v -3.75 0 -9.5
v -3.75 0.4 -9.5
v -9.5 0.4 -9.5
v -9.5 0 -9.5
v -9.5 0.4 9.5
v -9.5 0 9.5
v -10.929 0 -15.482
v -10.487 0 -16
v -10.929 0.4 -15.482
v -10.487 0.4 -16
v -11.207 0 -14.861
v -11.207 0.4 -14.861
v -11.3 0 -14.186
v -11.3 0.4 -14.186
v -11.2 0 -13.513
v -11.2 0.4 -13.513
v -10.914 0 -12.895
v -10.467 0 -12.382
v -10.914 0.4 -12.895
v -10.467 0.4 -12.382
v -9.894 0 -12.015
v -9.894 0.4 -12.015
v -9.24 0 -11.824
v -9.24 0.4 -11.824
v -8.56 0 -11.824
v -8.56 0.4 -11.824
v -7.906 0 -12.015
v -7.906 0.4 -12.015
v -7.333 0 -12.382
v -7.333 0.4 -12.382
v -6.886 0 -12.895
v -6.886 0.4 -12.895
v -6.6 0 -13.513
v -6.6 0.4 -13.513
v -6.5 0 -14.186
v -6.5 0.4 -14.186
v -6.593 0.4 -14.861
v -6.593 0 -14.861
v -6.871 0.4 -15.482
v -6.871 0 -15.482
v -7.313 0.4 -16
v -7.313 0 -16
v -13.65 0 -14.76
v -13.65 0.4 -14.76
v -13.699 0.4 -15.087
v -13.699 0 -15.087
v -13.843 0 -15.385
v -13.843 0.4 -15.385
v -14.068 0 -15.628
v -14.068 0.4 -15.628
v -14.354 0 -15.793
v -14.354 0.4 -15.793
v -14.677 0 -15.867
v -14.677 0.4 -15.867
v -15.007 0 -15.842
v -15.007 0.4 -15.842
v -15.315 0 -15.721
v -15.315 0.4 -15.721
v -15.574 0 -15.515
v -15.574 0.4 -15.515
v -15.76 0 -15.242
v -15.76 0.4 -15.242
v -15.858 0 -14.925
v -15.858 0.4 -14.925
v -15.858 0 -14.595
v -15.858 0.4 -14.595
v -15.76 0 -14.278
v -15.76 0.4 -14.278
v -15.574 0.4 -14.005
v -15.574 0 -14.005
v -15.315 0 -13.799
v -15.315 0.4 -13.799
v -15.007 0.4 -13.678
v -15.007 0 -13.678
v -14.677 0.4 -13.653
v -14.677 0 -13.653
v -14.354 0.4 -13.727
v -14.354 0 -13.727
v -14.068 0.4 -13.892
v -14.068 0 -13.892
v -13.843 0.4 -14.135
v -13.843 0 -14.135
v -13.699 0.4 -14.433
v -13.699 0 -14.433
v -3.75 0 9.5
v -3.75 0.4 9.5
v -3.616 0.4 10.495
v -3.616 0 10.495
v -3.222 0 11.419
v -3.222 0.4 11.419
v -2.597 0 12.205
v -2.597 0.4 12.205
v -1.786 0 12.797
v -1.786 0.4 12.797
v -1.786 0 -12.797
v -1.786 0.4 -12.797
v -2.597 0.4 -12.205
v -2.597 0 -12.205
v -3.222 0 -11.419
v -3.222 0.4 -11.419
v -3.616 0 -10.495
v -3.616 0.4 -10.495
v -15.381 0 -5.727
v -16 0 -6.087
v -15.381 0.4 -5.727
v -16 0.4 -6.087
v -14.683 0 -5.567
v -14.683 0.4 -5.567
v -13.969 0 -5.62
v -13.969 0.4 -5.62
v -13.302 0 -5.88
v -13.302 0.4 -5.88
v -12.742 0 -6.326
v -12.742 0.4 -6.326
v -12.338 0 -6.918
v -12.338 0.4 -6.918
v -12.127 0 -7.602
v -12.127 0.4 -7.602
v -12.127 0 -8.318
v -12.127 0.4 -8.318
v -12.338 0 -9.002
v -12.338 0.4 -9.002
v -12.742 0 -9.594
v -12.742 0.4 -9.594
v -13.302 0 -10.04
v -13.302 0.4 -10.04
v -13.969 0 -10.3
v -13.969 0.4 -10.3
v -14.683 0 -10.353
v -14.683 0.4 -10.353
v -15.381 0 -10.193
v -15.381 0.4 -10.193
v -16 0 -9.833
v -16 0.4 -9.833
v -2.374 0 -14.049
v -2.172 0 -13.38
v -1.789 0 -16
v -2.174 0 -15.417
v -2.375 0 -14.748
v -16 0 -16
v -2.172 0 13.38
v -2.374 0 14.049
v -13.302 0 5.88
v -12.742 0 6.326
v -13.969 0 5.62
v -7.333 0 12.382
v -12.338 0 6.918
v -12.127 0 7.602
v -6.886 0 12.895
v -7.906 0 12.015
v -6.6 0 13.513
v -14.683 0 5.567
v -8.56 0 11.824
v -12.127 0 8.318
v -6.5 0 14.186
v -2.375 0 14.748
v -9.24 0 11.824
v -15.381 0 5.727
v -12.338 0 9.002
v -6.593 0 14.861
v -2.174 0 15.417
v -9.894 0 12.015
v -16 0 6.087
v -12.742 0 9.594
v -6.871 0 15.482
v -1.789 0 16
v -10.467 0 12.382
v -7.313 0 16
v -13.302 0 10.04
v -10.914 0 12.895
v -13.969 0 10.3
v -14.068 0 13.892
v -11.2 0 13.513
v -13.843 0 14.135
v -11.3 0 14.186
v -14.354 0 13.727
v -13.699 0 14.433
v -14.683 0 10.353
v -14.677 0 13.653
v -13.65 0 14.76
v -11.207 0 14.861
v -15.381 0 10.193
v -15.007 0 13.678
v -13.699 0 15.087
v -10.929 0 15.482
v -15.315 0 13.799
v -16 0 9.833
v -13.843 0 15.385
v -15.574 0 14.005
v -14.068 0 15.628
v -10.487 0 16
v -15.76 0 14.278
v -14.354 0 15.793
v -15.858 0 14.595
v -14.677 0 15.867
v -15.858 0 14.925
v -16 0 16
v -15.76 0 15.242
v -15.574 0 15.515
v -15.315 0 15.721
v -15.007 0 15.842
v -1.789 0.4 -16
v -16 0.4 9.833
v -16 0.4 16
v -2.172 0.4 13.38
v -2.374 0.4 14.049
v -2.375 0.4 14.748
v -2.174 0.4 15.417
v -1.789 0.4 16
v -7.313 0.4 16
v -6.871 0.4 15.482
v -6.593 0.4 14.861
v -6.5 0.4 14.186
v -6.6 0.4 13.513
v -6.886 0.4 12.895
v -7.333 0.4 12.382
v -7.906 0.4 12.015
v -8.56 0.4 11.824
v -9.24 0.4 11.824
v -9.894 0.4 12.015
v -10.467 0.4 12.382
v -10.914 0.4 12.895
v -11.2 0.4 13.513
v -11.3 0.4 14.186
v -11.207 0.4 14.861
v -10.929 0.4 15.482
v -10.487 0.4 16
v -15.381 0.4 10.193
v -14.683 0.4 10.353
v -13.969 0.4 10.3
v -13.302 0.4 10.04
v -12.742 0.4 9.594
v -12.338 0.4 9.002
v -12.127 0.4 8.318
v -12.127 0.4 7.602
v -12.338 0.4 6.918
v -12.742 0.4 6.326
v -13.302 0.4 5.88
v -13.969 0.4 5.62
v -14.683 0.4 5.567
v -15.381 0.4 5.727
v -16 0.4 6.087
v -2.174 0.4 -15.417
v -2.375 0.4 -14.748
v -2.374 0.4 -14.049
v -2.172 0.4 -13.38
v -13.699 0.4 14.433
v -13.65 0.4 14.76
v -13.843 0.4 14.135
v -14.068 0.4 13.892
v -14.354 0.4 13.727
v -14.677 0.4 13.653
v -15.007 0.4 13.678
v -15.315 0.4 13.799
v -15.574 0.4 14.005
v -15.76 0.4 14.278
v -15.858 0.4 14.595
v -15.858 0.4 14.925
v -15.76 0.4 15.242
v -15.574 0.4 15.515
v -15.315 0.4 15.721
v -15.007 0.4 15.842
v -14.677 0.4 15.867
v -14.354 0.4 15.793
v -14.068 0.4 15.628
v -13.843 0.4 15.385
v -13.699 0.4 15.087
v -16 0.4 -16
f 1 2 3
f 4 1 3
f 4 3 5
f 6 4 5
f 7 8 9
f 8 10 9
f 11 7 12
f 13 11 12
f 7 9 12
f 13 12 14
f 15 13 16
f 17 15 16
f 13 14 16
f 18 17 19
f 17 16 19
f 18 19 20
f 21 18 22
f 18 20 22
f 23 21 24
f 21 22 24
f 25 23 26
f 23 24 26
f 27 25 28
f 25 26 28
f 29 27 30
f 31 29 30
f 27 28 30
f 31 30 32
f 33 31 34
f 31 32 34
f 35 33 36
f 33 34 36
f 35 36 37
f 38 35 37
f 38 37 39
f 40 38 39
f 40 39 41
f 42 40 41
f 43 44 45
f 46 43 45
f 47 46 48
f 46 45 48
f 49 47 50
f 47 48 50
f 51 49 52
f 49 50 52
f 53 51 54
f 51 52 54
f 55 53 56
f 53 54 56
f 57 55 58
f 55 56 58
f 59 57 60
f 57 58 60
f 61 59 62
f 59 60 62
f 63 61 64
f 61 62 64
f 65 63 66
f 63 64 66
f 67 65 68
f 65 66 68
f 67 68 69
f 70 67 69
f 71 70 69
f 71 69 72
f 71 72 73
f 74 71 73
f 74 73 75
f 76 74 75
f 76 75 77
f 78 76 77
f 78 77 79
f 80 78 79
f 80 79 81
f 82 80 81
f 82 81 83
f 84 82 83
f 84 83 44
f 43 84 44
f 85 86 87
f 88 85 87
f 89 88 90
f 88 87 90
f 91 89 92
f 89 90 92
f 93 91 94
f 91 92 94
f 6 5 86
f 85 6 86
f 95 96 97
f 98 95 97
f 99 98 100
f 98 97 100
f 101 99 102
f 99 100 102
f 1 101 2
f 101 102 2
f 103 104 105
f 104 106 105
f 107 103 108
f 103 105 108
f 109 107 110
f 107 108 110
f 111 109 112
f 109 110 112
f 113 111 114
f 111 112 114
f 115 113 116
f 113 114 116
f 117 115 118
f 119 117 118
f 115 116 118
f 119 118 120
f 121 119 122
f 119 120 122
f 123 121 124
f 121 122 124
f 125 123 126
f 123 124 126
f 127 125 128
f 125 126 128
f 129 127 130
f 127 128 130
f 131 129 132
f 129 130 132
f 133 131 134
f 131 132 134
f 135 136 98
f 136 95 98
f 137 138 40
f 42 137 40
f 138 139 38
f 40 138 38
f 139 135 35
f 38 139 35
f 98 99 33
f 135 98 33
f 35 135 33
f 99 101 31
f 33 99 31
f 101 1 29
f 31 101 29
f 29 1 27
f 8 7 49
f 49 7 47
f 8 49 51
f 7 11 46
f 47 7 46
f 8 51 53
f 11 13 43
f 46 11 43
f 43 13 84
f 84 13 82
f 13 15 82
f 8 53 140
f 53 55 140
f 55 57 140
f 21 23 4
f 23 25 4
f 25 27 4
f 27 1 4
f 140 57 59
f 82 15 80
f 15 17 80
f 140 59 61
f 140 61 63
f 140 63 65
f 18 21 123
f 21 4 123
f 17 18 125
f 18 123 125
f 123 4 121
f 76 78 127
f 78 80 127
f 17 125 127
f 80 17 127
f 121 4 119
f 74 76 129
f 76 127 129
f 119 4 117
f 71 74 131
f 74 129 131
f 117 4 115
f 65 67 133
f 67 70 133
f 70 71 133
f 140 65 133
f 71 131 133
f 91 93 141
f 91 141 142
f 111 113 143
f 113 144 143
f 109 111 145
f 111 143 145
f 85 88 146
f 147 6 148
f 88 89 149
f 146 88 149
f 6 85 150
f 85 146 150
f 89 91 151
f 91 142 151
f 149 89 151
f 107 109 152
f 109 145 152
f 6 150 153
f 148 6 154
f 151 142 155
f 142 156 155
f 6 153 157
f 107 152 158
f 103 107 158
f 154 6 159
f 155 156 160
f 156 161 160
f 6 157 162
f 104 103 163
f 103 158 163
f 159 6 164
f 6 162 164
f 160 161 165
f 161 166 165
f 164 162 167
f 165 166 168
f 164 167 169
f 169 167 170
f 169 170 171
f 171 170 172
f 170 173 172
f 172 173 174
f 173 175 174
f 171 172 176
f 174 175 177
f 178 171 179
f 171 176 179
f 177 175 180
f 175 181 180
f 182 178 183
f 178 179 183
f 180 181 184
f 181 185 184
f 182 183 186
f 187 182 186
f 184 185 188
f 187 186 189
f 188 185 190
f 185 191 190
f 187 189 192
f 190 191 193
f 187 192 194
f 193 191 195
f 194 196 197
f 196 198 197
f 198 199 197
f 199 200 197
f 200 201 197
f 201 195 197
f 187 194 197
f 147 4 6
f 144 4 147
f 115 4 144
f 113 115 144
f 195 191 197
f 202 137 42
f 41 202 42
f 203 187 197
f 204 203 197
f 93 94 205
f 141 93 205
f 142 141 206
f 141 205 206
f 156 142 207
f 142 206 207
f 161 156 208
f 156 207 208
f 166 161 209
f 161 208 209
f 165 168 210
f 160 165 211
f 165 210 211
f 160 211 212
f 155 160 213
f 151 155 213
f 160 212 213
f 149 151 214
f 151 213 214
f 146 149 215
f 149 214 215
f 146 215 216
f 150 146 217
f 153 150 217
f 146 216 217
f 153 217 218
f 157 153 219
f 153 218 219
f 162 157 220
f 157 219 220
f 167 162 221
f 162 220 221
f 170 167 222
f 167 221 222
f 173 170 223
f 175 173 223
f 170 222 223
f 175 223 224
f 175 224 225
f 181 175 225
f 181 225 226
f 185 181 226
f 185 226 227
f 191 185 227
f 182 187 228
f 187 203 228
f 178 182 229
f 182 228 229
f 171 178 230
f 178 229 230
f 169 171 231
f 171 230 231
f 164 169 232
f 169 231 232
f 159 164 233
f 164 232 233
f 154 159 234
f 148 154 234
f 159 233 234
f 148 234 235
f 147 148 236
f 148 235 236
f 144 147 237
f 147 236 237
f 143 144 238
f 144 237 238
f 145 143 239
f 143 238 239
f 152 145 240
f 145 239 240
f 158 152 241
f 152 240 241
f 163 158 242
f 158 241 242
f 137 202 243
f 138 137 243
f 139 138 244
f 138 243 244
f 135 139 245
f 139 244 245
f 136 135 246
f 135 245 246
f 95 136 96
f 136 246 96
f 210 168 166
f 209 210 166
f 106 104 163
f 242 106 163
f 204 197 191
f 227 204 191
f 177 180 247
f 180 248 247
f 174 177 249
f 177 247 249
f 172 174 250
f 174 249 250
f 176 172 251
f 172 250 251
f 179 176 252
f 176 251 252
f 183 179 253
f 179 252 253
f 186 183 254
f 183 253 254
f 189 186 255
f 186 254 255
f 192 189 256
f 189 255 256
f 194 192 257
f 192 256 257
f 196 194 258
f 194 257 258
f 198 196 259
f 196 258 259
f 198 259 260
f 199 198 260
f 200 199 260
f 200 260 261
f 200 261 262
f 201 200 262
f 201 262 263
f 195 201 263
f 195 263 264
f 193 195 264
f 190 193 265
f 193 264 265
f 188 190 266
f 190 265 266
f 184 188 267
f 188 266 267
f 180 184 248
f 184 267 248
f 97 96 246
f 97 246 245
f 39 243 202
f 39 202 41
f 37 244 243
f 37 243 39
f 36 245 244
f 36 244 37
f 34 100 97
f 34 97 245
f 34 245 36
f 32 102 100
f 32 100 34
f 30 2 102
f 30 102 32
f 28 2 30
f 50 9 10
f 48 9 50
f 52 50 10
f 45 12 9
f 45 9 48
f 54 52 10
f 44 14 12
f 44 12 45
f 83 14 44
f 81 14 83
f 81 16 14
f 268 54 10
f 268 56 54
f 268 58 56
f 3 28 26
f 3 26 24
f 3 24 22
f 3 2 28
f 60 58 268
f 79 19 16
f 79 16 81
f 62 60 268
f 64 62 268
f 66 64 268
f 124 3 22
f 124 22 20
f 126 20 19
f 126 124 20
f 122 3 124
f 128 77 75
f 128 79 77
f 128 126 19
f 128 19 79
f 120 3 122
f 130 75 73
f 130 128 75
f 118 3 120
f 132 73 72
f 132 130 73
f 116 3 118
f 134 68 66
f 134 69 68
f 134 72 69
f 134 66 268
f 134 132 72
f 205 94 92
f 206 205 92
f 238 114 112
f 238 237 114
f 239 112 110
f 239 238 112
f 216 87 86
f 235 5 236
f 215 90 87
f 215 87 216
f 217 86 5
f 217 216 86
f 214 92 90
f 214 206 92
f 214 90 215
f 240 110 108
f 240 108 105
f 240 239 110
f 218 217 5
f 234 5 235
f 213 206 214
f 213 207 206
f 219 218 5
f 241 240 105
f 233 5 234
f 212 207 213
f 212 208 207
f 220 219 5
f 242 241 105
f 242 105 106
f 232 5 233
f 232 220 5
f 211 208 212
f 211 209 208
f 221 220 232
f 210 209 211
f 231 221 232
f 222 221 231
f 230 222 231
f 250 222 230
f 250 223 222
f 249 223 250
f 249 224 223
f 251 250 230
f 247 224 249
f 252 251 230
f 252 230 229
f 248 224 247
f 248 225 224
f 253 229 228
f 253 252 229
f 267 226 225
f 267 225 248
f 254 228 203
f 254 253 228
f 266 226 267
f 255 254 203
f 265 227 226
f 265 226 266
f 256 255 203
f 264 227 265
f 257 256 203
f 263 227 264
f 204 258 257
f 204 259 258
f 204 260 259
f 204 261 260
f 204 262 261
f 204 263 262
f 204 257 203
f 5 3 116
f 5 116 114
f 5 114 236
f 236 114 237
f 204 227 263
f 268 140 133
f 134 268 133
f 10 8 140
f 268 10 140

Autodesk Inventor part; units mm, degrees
ref_plane "YZ Plane" through (0, 0, 0) normal (1, 0, 0) x (0, 1, 0)
ref_plane "XZ Plane" through (0, 0, 0) normal (0, 1, 0) x (-1, 0, 0)
ref_plane "XY Plane" through (0, 0, 0) normal (0, 0, 1) x (1, 0, 0)
sketch "Sketch1" plane through (0, 0, 0) normal (0, 1, 0) x (-1, 0, 0)
  line L0 (16, 16) -> (-16, 16)
  line L1 (-16, 16) -> (-16, -16)
  line L2 (-16, -16) -> (16, -16)
  line L3 (16, -16) -> (16, 16)
  line L4 (16, 16) -> (-16, -16) construction
  line L5 (-16, 16) -> (16, -16) construction
  point P0 (0, 0)
  dimension "d0" = 32
  dimension "d1" = 32
extrude "Extrusion1" add sketch "Sketch1" along normal blind 0.4
sketch "Sketch2" plane through (0, 0.4, 0) normal (0, 1, 0) x (1, 0, 0)
  line L0 (-9.5, -9.5) -> (9.5, -9.5)
  line L1 (9.5, -9.5) -> (9.5, 9.5)
  line L2 (9.5, 9.5) -> (-9.5, 9.5)
  line L3 (-9.5, 9.5) -> (-9.5, -9.5)
  line L4 (-9.5, -9.5) -> (9.5, 9.5) construction
  line L5 (9.5, -9.5) -> (-9.5, 9.5) construction
  circle A0 centre (0, 9.5) radius 3.75
  circle A1 centre (0, -9.5) radius 3.75
  point P0 (0, 0)
  point P1 (-3.75, -9.5)
  point P2 (3.75, -9.5)
  point P3 (3.75, 9.5)
  point P4 (-3.75, 9.5)
  dimension "d4" = 19
  dimension "d5" = 19
  dimension "d6" = 7.5
  dimension "d7" = 7.5
extrude "Extrusion2" cut sketch "Sketch2" against normal blind 0.4
sketch "Sketch3" plane through (0, 0.4, 0) normal (0, 1, 0) x (1, 0, 0)
  line L0 (-16, -16) -> (16, -16) projected
  line L1 (16, 16) -> (-16, 16) projected
  line L2 (0, -16) -> (16, -16)
  line L3 (16, -16) -> (16, 16)
  line L4 (16, 16) -> (0, 16)
  line L5 (0, 16) -> (0, -16)
  point P0 (0, 0)
extrude "Extrusion3" cut sketch "Sketch3" against normal blind 0.4
sketch "Sketch4" plane through (0, 0.4, 0) normal (0, 1, 0) x (1, 0, 0)
  circle A0 centre (-14.76, -14.76) radius 1.11
  circle A1 centre (-14.76, 14.76) radius 1.11
  line L0 (-16, 16) -> (-16, -16) projected
  line L1 (-16, -16) -> (0, -16) projected
  line L2 (0, 16) -> (-16, 16) projected
  circle A2 centre (0, -14.4) radius 2.4
  circle A3 centre (-14.5, 7.96) radius 2.4
  circle A4 centre (-14.5, -7.96) radius 2.4
  circle A5 centre (-8.9, -14.2) radius 2.4
  circle A6 centre (-8.9, 14.2) radius 2.4
  circle A7 centre (0, 14.4) radius 2.4
  line L3 (0, -16) -> (0, -13.25) projected
  line L4 (0, 13.25) -> (0, 16) projected
  point P0 (0, 0)
  point P1 (-7.3125, -16)
  point P2 (-10.4875, -16)
  point P3 (-10.4875, 16)
  point P4 (-7.3125, 16)
  point P5 (-16, -6.0865)
  point P6 (-16, -9.8335)
  point P7 (-16, 9.8335)
  point P8 (-16, 6.0865)
  dimension "d12" = 2.22
  dimension "d13" = 2.22
  dimension "d14" = 1.24
  dimension "d15" = 1.24
  dimension "d16" = 1.24
  dimension "d17" = 1.24
  dimension "d18" = 4.8
  dimension "d19" = 4.8
  dimension "d20" = 4.8
  dimension "d21" = 4.8
  dimension "d22" = 4.8
  dimension "d23" = 4.8
  dimension "d24" = 0
  dimension "d26" = 0
  dimension "d28" = 7.1
  dimension "d29" = 1.8
  dimension "d30" = 1.8
  dimension "d31" = 7.1
  dimension "d32" = 1.6
  dimension "d33" = 1.6
  dimension "d34" = 1.5
  dimension "d35" = 8.04
  dimension "d36" = 8.04
  dimension "d37" = 1.5
extrude "Extrusion4" cut sketch "Sketch4" against normal blind 0.4 contours A0 | A1 | A2 | A5 L1 | A4 L0 | A3 L0 | A7 | L2 A6 picked at (-8.777, -14.4925) picked at (-14.5551, -7.8666) picked at (-14.7976, 7.5771) picked at (-8.6453, 14.6416)
properties part number "Top Cover Power Side"
